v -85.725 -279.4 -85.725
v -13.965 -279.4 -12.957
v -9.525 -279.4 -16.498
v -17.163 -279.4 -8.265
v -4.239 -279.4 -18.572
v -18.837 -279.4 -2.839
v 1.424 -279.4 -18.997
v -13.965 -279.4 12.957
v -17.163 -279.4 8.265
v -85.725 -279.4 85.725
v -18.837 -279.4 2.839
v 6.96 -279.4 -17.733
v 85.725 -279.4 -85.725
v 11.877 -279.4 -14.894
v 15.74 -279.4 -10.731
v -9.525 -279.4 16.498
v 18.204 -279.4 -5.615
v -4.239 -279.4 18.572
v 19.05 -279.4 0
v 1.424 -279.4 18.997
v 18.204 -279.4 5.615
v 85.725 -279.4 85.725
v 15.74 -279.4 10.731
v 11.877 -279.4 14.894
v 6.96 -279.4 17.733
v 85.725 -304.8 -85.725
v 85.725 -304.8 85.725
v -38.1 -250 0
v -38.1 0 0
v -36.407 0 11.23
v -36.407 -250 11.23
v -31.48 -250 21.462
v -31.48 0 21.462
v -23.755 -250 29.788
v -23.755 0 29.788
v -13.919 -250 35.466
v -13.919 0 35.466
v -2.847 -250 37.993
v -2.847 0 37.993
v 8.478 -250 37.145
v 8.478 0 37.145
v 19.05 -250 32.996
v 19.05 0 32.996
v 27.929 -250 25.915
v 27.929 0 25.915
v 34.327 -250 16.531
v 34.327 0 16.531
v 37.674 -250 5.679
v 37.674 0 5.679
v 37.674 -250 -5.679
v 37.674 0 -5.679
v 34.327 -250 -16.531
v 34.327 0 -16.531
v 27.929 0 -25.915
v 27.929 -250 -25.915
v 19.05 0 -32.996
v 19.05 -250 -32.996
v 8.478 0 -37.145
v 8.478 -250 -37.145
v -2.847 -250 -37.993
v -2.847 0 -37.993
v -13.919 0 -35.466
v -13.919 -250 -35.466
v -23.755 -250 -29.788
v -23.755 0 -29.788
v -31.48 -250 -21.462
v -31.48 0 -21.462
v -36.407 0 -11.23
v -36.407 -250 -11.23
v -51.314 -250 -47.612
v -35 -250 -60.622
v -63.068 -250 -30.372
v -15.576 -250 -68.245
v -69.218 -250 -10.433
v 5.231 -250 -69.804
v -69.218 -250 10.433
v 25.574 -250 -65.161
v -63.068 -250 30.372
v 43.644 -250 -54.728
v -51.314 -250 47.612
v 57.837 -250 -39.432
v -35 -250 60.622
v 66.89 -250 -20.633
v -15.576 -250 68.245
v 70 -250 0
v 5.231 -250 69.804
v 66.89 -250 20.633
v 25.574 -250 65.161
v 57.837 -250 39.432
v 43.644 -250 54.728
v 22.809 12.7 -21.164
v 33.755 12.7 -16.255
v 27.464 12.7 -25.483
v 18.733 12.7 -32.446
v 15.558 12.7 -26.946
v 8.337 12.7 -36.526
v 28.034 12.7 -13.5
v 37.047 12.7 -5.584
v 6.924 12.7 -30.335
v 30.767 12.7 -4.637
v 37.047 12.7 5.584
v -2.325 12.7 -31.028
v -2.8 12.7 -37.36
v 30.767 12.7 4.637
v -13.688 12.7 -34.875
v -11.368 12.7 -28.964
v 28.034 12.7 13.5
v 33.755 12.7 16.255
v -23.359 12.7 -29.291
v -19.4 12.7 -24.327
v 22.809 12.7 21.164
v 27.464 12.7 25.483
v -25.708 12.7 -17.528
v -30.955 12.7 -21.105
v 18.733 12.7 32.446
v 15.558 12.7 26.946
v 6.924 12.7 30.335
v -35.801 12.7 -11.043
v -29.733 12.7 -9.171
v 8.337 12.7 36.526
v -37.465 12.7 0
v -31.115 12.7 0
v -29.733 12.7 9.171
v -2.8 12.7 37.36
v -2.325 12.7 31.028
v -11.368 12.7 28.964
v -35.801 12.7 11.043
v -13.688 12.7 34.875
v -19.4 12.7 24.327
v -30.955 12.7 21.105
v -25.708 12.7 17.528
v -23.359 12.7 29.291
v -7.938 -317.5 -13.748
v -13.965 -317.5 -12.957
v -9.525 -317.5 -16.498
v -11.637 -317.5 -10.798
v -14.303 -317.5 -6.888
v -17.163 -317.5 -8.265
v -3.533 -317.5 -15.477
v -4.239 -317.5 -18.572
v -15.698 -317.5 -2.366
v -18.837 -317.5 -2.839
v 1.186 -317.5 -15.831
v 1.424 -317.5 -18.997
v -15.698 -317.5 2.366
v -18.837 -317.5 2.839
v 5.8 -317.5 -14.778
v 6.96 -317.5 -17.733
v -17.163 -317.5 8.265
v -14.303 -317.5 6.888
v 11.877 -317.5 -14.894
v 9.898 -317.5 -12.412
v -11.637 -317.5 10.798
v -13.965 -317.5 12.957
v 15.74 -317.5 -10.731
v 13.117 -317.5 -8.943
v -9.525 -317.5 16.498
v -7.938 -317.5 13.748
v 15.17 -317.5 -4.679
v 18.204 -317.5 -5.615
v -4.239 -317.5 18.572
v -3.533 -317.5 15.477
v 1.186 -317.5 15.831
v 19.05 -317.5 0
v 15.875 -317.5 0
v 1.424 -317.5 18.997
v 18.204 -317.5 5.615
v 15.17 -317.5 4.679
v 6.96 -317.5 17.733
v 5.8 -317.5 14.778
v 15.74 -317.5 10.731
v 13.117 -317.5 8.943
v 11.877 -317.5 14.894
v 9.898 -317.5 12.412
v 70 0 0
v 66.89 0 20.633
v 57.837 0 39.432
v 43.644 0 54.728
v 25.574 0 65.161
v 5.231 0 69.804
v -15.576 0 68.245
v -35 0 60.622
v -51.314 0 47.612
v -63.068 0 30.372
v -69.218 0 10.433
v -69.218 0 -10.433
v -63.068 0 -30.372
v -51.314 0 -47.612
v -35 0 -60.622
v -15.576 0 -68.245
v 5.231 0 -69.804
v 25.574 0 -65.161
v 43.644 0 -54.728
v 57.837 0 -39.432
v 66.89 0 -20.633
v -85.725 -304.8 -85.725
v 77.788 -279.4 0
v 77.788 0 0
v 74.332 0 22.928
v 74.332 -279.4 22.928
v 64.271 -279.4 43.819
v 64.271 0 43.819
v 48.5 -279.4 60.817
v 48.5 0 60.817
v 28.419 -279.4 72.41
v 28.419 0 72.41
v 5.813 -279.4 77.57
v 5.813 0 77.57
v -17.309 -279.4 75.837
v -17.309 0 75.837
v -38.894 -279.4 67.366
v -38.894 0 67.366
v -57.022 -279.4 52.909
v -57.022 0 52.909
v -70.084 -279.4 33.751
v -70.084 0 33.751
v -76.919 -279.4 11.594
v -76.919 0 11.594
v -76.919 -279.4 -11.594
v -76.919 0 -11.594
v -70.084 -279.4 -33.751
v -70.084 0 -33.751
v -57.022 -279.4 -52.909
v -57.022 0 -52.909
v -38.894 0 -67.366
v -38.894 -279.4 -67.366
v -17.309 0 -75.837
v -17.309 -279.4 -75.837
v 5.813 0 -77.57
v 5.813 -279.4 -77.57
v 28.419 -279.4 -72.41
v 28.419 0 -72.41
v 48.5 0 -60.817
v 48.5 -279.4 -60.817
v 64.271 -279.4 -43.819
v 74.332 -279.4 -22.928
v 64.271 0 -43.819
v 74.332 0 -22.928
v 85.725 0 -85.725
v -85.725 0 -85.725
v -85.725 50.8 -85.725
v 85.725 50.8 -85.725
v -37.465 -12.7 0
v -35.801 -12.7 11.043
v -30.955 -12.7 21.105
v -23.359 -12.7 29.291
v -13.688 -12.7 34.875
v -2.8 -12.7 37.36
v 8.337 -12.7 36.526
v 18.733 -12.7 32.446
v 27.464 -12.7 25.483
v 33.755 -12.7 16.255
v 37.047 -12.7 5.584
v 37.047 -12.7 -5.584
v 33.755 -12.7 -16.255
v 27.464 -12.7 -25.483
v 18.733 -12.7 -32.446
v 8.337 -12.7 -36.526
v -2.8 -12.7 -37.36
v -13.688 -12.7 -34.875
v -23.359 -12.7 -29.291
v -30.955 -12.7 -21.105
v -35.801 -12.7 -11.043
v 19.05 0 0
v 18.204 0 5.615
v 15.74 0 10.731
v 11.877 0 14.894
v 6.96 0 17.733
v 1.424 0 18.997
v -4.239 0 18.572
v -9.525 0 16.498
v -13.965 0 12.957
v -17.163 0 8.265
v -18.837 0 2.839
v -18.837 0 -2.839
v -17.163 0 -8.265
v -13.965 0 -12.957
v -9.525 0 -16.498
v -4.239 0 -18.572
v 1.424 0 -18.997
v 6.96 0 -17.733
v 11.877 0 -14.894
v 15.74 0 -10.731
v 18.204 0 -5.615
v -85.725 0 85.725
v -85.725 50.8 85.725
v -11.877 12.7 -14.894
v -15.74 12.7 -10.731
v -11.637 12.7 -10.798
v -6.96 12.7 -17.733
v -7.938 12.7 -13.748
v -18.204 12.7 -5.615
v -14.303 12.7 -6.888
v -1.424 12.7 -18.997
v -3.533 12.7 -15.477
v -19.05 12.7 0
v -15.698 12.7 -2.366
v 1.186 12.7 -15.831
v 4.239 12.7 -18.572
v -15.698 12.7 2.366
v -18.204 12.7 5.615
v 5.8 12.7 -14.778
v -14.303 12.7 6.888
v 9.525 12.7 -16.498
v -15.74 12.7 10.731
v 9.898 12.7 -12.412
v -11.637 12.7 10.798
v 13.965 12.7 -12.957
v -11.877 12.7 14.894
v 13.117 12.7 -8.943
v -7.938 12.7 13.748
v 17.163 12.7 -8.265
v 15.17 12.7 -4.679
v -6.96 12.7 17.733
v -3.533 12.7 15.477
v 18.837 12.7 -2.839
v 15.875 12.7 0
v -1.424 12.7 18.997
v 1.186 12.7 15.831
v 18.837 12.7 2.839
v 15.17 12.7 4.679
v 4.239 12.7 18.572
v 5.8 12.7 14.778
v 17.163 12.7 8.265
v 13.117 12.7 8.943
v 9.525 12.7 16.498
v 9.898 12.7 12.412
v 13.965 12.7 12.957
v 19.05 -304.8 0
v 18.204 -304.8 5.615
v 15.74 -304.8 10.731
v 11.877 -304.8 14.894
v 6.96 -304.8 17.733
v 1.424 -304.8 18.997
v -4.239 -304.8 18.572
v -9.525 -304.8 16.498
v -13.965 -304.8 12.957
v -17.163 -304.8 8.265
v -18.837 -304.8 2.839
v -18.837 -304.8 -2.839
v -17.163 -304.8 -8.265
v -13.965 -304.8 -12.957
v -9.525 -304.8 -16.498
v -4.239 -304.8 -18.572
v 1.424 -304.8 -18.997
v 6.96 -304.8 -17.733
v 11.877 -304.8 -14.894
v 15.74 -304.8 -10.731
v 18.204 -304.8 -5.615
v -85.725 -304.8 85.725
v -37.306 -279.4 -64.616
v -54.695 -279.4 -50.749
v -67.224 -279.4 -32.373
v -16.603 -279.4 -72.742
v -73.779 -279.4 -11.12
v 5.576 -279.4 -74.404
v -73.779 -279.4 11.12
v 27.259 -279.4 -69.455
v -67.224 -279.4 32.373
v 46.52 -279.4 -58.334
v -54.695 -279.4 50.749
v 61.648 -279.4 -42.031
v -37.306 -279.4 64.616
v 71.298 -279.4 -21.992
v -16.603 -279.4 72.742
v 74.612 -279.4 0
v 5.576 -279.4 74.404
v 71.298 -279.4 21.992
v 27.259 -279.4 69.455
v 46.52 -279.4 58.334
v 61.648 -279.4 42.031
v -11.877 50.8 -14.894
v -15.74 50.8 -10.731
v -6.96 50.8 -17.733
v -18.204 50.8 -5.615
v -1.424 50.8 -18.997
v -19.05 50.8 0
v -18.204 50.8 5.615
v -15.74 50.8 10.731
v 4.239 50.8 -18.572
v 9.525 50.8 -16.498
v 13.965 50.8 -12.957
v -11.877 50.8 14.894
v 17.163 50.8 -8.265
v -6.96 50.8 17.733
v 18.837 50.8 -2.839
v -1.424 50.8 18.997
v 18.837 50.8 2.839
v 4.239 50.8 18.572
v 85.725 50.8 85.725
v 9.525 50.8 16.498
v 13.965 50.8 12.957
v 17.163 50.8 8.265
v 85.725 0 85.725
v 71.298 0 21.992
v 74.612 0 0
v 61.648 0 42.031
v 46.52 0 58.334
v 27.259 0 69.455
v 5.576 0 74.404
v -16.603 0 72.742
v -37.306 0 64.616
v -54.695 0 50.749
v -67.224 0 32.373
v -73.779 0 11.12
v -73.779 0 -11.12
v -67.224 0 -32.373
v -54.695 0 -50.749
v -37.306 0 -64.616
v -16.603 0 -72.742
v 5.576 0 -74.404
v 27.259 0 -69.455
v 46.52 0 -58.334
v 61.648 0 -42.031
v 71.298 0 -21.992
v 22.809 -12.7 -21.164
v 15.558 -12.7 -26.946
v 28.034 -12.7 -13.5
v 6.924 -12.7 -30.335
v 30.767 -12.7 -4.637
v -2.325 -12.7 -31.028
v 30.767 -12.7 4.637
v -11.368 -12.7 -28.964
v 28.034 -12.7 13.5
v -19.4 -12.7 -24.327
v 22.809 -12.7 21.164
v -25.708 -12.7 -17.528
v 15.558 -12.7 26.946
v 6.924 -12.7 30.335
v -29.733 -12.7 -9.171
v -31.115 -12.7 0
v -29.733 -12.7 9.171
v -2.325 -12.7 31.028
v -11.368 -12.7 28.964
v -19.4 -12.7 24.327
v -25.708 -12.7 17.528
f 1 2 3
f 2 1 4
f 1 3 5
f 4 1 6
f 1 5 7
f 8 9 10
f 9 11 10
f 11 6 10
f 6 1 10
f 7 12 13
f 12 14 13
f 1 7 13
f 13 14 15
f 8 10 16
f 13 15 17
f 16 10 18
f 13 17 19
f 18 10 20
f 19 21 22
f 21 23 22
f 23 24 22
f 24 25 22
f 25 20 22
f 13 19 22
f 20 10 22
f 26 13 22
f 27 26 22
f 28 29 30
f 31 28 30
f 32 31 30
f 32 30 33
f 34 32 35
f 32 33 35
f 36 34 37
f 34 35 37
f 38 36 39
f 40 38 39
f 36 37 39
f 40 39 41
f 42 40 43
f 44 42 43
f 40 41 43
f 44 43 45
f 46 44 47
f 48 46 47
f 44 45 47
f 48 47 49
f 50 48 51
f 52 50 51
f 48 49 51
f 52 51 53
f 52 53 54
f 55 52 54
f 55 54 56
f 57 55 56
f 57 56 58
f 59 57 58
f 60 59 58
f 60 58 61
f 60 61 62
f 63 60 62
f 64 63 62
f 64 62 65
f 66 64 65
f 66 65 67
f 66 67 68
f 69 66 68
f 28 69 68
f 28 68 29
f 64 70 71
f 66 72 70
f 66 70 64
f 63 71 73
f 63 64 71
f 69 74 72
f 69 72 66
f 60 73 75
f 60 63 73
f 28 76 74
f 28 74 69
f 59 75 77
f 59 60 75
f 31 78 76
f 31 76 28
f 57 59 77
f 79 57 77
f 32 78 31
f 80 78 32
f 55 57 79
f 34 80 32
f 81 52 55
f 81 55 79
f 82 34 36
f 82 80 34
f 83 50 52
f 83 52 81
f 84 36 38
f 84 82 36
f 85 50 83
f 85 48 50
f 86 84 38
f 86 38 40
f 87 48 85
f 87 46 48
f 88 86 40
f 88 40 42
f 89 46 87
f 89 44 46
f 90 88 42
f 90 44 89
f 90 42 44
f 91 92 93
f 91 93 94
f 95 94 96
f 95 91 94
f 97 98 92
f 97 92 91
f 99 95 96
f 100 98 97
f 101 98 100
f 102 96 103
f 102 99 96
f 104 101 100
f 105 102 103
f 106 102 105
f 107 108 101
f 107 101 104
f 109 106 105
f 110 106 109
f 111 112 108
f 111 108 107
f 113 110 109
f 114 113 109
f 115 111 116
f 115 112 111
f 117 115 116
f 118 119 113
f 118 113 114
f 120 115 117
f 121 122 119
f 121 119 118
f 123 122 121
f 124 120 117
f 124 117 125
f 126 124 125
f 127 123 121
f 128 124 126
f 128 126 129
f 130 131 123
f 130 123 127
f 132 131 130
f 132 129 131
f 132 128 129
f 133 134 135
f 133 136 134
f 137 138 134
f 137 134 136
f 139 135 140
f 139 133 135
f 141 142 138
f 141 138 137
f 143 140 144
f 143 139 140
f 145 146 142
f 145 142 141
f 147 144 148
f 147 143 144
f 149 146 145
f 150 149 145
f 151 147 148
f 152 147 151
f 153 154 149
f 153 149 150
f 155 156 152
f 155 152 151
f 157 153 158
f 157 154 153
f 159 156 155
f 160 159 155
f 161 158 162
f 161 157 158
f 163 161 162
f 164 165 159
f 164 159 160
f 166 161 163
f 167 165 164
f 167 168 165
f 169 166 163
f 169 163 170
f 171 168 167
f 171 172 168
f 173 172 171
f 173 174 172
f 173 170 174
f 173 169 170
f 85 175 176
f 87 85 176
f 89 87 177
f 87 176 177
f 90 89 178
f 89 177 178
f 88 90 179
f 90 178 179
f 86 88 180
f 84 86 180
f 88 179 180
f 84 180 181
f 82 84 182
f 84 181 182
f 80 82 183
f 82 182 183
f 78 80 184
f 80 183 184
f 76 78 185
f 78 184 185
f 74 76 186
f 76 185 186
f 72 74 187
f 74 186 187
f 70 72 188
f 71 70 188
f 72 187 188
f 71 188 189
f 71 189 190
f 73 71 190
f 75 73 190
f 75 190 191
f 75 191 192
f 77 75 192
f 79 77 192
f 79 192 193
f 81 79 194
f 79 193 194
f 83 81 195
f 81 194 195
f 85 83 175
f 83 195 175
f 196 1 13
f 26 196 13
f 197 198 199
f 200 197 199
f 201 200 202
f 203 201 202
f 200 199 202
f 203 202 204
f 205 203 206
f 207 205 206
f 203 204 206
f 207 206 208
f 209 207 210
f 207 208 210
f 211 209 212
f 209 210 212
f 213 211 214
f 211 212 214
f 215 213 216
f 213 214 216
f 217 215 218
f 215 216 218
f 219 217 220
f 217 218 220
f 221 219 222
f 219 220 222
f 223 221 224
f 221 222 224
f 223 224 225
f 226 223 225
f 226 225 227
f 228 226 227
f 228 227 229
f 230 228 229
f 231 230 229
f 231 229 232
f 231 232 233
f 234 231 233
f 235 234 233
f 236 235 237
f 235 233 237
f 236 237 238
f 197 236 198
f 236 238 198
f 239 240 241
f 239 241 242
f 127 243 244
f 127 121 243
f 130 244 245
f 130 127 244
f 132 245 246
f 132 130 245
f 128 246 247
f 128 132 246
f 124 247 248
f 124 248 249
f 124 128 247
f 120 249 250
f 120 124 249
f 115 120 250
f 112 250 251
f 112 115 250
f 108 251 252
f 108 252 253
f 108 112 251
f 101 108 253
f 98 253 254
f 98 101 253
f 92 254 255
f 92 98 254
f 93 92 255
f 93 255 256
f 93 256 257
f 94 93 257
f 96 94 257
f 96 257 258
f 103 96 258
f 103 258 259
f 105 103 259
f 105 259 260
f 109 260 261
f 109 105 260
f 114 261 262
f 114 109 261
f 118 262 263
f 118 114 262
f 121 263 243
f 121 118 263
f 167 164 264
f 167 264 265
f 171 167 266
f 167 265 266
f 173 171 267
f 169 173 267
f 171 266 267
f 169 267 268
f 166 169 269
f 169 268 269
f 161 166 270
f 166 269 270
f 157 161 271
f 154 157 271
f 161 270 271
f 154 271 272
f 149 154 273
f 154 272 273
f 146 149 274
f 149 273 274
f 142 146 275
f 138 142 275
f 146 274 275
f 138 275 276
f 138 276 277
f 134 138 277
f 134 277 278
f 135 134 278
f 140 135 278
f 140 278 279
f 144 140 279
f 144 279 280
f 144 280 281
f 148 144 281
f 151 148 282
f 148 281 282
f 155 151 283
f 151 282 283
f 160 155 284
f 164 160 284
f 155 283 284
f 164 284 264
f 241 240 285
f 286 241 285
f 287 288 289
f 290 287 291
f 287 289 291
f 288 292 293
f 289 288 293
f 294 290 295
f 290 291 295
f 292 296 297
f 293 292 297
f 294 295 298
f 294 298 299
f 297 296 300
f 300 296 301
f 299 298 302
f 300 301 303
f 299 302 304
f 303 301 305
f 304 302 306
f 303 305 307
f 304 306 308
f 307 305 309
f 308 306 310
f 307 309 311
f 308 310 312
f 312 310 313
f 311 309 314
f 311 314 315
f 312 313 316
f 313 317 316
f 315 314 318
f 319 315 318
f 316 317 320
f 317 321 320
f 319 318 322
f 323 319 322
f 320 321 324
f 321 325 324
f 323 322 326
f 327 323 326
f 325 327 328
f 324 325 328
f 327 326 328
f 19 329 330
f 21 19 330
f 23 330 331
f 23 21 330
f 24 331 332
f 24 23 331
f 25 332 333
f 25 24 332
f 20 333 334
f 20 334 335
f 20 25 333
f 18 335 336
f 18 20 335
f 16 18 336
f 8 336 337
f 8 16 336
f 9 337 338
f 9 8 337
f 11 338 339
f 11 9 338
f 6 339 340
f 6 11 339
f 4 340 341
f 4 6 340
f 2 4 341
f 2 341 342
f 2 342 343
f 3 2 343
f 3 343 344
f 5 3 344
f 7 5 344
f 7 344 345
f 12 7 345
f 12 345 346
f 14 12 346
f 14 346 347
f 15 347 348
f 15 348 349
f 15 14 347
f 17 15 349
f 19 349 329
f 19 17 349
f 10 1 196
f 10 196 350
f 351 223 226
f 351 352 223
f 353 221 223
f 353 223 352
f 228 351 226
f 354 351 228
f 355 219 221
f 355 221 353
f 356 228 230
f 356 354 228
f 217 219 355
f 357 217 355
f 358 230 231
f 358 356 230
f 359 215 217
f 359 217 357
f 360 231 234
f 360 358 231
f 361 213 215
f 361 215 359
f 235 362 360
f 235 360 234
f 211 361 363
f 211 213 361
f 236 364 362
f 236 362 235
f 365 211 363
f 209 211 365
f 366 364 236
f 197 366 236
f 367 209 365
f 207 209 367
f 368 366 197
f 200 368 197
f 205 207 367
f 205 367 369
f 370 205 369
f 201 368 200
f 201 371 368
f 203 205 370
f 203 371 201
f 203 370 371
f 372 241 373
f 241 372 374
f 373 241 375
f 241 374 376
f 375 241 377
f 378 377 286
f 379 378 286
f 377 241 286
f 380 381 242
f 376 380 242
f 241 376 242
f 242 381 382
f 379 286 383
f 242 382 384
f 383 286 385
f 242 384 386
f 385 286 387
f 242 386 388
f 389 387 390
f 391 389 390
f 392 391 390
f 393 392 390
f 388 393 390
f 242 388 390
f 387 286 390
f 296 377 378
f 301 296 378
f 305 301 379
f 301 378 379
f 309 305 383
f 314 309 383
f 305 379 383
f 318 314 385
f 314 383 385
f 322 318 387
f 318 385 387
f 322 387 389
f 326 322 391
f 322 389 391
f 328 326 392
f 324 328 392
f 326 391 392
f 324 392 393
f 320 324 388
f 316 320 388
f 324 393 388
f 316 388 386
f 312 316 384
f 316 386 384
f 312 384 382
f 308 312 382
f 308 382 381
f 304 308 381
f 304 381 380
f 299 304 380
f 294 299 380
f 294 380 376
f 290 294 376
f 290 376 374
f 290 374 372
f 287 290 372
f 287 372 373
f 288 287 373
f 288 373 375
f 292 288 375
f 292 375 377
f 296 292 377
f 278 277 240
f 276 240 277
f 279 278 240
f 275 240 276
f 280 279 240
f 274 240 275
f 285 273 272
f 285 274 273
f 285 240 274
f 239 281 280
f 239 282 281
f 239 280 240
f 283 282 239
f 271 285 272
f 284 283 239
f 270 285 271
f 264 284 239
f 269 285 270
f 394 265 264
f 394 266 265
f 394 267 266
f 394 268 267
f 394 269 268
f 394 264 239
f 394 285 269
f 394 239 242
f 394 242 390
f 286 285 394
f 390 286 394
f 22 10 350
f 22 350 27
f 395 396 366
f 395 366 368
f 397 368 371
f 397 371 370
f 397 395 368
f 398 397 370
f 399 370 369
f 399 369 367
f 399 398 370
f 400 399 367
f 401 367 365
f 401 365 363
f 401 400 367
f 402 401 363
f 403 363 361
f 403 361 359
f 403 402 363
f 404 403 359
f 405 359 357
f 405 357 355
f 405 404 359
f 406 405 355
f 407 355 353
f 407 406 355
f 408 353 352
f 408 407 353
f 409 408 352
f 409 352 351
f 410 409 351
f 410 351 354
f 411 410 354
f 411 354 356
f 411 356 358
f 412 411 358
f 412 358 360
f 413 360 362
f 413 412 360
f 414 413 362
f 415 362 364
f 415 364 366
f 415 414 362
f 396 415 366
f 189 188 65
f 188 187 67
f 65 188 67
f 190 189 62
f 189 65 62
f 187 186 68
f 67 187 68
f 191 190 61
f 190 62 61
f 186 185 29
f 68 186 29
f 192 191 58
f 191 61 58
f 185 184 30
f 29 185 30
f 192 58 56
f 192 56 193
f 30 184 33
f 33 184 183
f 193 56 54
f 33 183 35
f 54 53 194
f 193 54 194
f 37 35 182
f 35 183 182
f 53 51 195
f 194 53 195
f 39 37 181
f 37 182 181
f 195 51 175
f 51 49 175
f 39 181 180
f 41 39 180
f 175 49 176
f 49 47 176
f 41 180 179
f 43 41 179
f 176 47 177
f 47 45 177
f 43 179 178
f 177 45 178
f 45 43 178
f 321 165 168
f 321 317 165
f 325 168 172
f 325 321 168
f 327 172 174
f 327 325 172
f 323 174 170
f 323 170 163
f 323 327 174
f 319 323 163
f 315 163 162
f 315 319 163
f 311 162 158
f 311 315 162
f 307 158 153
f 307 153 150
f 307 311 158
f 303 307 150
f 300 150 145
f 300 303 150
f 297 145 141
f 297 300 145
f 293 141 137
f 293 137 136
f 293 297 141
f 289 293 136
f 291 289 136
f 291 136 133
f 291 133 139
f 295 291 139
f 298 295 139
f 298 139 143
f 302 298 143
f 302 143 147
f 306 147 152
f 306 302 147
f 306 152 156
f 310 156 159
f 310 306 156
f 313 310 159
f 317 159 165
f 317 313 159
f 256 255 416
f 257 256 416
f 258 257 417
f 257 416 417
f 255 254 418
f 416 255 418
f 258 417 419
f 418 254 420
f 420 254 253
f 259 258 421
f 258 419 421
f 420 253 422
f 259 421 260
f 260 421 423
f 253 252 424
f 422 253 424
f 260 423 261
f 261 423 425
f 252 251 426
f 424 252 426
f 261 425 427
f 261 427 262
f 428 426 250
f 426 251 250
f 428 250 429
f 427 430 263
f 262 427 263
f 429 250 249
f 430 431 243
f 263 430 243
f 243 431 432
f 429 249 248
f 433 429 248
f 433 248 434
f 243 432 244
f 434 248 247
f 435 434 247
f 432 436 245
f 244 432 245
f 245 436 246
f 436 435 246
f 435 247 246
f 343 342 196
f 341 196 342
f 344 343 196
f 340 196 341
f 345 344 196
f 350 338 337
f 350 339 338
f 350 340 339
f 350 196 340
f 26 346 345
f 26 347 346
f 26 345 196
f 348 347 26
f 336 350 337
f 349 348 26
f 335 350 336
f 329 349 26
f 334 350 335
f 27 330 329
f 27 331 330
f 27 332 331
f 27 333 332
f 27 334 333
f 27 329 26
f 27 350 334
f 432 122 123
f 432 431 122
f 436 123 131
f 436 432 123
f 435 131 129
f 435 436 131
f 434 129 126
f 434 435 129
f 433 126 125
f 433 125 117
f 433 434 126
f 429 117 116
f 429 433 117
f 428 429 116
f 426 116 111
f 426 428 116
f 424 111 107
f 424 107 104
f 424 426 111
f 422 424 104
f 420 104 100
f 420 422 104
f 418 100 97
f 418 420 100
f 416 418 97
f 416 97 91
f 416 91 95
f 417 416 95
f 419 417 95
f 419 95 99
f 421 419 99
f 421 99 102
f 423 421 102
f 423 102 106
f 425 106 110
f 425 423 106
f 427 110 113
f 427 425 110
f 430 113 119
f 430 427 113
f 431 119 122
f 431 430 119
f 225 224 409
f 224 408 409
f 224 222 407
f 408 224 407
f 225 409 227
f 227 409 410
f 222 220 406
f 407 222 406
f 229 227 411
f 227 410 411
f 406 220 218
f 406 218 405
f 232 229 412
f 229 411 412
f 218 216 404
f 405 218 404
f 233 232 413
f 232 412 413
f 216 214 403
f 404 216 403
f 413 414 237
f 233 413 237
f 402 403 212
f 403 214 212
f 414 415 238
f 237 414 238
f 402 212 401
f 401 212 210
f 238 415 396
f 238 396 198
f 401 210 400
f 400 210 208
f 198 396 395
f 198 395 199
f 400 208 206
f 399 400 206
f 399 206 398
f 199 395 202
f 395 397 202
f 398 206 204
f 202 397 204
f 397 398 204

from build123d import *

# Parameters (mm, degrees)
F0_R      = 70
F1_DEPTH  = 250
F2_R      = 38.1
F3_DEPTH  = 250.001
F4_R      = 37.465
F4_R_2    = 31.115
F5_DEPTH  = 12.7
F6_R      = 77.7875
F6_R_2    = 74.6125
F7_DEPTH  = 279.4
F8_W      = 171.45
F8_H      = 171.45
F9_DEPTH  = 50.8
F10_R     = 19.05
F11_DEPTH = 330.201
F12_R     = 19.05
F12_R_2   = 15.875
F13_DEPTH = 12.7
F14_R     = 19.05
F14_R_2   = 15.875
F15_DEPTH = 304.8
F16_W     = 171.45
F16_H     = 171.45
F16_R     = 19.05
F17_DEPTH = 25.4


with BuildPart() as f1:
    # F0 (on Front) → F1 (new body)
    with BuildSketch(Plane.XZ):
        Circle(F0_R)
    extrude(amount=F1_DEPTH)

    # F2 (on face) → F3 (cut, through all)
    with BuildSketch(Plane(origin=(0, 0, 0), x_dir=(-1, 0, 0), z_dir=(0, 1, 0))):
        Circle(F2_R)
    extrude(amount=-F3_DEPTH, mode=Mode.SUBTRACT)


with BuildPart() as f5:
    # F4 (on face) → F5 (new body, symmetric)
    with BuildSketch(Plane(origin=(0, 0, 0), x_dir=(-1, 0, 0), z_dir=(0, 1, 0))):
        Circle(F4_R)
        Circle(F4_R_2, mode=Mode.SUBTRACT)
    extrude(amount=F5_DEPTH, both=True)


with BuildPart() as f7:
    # F6 (on Front) → F7 (new body)
    with BuildSketch(Plane.XZ):
        Circle(F6_R)
        Circle(F6_R_2, mode=Mode.SUBTRACT)
    extrude(amount=F7_DEPTH)


with BuildPart() as f9:
    # F8 (on Front) → F9 (new body)
    with BuildSketch(Plane.XZ):
        Rectangle(F8_W, F8_H)
    extrude(amount=-F9_DEPTH)

    # F10 (on face) → F11 (cut, through all)
    with BuildSketch(Plane(origin=(0, 50.8, 0), x_dir=(-1, 0, 0), z_dir=(0, 1, 0))):
        Circle(F10_R)
    extrude(amount=-F11_DEPTH, mode=Mode.SUBTRACT)

    # F12 (on face) → F13 (join, symmetric)
    with BuildSketch(Plane.XZ):
        Circle(F12_R)
        Circle(F12_R_2, mode=Mode.SUBTRACT)
    extrude(amount=F13_DEPTH, both=True)

    # F14 (on face) → F15 (join)
    with BuildSketch(Plane.XZ.offset(12.7)):
        Circle(F14_R)
        Circle(F14_R_2, mode=Mode.SUBTRACT)
    extrude(amount=F15_DEPTH)


with BuildPart() as f17:
    # F16 (on face) → F17 (new body)
    with BuildSketch(Plane.XZ.offset(279.4)):
        Rectangle(F16_W, F16_H)
        Circle(F16_R, mode=Mode.SUBTRACT)
    extrude(amount=F17_DEPTH)


solid = Compound([f1.part, f5.part, f7.part, f9.part, f17.part])
